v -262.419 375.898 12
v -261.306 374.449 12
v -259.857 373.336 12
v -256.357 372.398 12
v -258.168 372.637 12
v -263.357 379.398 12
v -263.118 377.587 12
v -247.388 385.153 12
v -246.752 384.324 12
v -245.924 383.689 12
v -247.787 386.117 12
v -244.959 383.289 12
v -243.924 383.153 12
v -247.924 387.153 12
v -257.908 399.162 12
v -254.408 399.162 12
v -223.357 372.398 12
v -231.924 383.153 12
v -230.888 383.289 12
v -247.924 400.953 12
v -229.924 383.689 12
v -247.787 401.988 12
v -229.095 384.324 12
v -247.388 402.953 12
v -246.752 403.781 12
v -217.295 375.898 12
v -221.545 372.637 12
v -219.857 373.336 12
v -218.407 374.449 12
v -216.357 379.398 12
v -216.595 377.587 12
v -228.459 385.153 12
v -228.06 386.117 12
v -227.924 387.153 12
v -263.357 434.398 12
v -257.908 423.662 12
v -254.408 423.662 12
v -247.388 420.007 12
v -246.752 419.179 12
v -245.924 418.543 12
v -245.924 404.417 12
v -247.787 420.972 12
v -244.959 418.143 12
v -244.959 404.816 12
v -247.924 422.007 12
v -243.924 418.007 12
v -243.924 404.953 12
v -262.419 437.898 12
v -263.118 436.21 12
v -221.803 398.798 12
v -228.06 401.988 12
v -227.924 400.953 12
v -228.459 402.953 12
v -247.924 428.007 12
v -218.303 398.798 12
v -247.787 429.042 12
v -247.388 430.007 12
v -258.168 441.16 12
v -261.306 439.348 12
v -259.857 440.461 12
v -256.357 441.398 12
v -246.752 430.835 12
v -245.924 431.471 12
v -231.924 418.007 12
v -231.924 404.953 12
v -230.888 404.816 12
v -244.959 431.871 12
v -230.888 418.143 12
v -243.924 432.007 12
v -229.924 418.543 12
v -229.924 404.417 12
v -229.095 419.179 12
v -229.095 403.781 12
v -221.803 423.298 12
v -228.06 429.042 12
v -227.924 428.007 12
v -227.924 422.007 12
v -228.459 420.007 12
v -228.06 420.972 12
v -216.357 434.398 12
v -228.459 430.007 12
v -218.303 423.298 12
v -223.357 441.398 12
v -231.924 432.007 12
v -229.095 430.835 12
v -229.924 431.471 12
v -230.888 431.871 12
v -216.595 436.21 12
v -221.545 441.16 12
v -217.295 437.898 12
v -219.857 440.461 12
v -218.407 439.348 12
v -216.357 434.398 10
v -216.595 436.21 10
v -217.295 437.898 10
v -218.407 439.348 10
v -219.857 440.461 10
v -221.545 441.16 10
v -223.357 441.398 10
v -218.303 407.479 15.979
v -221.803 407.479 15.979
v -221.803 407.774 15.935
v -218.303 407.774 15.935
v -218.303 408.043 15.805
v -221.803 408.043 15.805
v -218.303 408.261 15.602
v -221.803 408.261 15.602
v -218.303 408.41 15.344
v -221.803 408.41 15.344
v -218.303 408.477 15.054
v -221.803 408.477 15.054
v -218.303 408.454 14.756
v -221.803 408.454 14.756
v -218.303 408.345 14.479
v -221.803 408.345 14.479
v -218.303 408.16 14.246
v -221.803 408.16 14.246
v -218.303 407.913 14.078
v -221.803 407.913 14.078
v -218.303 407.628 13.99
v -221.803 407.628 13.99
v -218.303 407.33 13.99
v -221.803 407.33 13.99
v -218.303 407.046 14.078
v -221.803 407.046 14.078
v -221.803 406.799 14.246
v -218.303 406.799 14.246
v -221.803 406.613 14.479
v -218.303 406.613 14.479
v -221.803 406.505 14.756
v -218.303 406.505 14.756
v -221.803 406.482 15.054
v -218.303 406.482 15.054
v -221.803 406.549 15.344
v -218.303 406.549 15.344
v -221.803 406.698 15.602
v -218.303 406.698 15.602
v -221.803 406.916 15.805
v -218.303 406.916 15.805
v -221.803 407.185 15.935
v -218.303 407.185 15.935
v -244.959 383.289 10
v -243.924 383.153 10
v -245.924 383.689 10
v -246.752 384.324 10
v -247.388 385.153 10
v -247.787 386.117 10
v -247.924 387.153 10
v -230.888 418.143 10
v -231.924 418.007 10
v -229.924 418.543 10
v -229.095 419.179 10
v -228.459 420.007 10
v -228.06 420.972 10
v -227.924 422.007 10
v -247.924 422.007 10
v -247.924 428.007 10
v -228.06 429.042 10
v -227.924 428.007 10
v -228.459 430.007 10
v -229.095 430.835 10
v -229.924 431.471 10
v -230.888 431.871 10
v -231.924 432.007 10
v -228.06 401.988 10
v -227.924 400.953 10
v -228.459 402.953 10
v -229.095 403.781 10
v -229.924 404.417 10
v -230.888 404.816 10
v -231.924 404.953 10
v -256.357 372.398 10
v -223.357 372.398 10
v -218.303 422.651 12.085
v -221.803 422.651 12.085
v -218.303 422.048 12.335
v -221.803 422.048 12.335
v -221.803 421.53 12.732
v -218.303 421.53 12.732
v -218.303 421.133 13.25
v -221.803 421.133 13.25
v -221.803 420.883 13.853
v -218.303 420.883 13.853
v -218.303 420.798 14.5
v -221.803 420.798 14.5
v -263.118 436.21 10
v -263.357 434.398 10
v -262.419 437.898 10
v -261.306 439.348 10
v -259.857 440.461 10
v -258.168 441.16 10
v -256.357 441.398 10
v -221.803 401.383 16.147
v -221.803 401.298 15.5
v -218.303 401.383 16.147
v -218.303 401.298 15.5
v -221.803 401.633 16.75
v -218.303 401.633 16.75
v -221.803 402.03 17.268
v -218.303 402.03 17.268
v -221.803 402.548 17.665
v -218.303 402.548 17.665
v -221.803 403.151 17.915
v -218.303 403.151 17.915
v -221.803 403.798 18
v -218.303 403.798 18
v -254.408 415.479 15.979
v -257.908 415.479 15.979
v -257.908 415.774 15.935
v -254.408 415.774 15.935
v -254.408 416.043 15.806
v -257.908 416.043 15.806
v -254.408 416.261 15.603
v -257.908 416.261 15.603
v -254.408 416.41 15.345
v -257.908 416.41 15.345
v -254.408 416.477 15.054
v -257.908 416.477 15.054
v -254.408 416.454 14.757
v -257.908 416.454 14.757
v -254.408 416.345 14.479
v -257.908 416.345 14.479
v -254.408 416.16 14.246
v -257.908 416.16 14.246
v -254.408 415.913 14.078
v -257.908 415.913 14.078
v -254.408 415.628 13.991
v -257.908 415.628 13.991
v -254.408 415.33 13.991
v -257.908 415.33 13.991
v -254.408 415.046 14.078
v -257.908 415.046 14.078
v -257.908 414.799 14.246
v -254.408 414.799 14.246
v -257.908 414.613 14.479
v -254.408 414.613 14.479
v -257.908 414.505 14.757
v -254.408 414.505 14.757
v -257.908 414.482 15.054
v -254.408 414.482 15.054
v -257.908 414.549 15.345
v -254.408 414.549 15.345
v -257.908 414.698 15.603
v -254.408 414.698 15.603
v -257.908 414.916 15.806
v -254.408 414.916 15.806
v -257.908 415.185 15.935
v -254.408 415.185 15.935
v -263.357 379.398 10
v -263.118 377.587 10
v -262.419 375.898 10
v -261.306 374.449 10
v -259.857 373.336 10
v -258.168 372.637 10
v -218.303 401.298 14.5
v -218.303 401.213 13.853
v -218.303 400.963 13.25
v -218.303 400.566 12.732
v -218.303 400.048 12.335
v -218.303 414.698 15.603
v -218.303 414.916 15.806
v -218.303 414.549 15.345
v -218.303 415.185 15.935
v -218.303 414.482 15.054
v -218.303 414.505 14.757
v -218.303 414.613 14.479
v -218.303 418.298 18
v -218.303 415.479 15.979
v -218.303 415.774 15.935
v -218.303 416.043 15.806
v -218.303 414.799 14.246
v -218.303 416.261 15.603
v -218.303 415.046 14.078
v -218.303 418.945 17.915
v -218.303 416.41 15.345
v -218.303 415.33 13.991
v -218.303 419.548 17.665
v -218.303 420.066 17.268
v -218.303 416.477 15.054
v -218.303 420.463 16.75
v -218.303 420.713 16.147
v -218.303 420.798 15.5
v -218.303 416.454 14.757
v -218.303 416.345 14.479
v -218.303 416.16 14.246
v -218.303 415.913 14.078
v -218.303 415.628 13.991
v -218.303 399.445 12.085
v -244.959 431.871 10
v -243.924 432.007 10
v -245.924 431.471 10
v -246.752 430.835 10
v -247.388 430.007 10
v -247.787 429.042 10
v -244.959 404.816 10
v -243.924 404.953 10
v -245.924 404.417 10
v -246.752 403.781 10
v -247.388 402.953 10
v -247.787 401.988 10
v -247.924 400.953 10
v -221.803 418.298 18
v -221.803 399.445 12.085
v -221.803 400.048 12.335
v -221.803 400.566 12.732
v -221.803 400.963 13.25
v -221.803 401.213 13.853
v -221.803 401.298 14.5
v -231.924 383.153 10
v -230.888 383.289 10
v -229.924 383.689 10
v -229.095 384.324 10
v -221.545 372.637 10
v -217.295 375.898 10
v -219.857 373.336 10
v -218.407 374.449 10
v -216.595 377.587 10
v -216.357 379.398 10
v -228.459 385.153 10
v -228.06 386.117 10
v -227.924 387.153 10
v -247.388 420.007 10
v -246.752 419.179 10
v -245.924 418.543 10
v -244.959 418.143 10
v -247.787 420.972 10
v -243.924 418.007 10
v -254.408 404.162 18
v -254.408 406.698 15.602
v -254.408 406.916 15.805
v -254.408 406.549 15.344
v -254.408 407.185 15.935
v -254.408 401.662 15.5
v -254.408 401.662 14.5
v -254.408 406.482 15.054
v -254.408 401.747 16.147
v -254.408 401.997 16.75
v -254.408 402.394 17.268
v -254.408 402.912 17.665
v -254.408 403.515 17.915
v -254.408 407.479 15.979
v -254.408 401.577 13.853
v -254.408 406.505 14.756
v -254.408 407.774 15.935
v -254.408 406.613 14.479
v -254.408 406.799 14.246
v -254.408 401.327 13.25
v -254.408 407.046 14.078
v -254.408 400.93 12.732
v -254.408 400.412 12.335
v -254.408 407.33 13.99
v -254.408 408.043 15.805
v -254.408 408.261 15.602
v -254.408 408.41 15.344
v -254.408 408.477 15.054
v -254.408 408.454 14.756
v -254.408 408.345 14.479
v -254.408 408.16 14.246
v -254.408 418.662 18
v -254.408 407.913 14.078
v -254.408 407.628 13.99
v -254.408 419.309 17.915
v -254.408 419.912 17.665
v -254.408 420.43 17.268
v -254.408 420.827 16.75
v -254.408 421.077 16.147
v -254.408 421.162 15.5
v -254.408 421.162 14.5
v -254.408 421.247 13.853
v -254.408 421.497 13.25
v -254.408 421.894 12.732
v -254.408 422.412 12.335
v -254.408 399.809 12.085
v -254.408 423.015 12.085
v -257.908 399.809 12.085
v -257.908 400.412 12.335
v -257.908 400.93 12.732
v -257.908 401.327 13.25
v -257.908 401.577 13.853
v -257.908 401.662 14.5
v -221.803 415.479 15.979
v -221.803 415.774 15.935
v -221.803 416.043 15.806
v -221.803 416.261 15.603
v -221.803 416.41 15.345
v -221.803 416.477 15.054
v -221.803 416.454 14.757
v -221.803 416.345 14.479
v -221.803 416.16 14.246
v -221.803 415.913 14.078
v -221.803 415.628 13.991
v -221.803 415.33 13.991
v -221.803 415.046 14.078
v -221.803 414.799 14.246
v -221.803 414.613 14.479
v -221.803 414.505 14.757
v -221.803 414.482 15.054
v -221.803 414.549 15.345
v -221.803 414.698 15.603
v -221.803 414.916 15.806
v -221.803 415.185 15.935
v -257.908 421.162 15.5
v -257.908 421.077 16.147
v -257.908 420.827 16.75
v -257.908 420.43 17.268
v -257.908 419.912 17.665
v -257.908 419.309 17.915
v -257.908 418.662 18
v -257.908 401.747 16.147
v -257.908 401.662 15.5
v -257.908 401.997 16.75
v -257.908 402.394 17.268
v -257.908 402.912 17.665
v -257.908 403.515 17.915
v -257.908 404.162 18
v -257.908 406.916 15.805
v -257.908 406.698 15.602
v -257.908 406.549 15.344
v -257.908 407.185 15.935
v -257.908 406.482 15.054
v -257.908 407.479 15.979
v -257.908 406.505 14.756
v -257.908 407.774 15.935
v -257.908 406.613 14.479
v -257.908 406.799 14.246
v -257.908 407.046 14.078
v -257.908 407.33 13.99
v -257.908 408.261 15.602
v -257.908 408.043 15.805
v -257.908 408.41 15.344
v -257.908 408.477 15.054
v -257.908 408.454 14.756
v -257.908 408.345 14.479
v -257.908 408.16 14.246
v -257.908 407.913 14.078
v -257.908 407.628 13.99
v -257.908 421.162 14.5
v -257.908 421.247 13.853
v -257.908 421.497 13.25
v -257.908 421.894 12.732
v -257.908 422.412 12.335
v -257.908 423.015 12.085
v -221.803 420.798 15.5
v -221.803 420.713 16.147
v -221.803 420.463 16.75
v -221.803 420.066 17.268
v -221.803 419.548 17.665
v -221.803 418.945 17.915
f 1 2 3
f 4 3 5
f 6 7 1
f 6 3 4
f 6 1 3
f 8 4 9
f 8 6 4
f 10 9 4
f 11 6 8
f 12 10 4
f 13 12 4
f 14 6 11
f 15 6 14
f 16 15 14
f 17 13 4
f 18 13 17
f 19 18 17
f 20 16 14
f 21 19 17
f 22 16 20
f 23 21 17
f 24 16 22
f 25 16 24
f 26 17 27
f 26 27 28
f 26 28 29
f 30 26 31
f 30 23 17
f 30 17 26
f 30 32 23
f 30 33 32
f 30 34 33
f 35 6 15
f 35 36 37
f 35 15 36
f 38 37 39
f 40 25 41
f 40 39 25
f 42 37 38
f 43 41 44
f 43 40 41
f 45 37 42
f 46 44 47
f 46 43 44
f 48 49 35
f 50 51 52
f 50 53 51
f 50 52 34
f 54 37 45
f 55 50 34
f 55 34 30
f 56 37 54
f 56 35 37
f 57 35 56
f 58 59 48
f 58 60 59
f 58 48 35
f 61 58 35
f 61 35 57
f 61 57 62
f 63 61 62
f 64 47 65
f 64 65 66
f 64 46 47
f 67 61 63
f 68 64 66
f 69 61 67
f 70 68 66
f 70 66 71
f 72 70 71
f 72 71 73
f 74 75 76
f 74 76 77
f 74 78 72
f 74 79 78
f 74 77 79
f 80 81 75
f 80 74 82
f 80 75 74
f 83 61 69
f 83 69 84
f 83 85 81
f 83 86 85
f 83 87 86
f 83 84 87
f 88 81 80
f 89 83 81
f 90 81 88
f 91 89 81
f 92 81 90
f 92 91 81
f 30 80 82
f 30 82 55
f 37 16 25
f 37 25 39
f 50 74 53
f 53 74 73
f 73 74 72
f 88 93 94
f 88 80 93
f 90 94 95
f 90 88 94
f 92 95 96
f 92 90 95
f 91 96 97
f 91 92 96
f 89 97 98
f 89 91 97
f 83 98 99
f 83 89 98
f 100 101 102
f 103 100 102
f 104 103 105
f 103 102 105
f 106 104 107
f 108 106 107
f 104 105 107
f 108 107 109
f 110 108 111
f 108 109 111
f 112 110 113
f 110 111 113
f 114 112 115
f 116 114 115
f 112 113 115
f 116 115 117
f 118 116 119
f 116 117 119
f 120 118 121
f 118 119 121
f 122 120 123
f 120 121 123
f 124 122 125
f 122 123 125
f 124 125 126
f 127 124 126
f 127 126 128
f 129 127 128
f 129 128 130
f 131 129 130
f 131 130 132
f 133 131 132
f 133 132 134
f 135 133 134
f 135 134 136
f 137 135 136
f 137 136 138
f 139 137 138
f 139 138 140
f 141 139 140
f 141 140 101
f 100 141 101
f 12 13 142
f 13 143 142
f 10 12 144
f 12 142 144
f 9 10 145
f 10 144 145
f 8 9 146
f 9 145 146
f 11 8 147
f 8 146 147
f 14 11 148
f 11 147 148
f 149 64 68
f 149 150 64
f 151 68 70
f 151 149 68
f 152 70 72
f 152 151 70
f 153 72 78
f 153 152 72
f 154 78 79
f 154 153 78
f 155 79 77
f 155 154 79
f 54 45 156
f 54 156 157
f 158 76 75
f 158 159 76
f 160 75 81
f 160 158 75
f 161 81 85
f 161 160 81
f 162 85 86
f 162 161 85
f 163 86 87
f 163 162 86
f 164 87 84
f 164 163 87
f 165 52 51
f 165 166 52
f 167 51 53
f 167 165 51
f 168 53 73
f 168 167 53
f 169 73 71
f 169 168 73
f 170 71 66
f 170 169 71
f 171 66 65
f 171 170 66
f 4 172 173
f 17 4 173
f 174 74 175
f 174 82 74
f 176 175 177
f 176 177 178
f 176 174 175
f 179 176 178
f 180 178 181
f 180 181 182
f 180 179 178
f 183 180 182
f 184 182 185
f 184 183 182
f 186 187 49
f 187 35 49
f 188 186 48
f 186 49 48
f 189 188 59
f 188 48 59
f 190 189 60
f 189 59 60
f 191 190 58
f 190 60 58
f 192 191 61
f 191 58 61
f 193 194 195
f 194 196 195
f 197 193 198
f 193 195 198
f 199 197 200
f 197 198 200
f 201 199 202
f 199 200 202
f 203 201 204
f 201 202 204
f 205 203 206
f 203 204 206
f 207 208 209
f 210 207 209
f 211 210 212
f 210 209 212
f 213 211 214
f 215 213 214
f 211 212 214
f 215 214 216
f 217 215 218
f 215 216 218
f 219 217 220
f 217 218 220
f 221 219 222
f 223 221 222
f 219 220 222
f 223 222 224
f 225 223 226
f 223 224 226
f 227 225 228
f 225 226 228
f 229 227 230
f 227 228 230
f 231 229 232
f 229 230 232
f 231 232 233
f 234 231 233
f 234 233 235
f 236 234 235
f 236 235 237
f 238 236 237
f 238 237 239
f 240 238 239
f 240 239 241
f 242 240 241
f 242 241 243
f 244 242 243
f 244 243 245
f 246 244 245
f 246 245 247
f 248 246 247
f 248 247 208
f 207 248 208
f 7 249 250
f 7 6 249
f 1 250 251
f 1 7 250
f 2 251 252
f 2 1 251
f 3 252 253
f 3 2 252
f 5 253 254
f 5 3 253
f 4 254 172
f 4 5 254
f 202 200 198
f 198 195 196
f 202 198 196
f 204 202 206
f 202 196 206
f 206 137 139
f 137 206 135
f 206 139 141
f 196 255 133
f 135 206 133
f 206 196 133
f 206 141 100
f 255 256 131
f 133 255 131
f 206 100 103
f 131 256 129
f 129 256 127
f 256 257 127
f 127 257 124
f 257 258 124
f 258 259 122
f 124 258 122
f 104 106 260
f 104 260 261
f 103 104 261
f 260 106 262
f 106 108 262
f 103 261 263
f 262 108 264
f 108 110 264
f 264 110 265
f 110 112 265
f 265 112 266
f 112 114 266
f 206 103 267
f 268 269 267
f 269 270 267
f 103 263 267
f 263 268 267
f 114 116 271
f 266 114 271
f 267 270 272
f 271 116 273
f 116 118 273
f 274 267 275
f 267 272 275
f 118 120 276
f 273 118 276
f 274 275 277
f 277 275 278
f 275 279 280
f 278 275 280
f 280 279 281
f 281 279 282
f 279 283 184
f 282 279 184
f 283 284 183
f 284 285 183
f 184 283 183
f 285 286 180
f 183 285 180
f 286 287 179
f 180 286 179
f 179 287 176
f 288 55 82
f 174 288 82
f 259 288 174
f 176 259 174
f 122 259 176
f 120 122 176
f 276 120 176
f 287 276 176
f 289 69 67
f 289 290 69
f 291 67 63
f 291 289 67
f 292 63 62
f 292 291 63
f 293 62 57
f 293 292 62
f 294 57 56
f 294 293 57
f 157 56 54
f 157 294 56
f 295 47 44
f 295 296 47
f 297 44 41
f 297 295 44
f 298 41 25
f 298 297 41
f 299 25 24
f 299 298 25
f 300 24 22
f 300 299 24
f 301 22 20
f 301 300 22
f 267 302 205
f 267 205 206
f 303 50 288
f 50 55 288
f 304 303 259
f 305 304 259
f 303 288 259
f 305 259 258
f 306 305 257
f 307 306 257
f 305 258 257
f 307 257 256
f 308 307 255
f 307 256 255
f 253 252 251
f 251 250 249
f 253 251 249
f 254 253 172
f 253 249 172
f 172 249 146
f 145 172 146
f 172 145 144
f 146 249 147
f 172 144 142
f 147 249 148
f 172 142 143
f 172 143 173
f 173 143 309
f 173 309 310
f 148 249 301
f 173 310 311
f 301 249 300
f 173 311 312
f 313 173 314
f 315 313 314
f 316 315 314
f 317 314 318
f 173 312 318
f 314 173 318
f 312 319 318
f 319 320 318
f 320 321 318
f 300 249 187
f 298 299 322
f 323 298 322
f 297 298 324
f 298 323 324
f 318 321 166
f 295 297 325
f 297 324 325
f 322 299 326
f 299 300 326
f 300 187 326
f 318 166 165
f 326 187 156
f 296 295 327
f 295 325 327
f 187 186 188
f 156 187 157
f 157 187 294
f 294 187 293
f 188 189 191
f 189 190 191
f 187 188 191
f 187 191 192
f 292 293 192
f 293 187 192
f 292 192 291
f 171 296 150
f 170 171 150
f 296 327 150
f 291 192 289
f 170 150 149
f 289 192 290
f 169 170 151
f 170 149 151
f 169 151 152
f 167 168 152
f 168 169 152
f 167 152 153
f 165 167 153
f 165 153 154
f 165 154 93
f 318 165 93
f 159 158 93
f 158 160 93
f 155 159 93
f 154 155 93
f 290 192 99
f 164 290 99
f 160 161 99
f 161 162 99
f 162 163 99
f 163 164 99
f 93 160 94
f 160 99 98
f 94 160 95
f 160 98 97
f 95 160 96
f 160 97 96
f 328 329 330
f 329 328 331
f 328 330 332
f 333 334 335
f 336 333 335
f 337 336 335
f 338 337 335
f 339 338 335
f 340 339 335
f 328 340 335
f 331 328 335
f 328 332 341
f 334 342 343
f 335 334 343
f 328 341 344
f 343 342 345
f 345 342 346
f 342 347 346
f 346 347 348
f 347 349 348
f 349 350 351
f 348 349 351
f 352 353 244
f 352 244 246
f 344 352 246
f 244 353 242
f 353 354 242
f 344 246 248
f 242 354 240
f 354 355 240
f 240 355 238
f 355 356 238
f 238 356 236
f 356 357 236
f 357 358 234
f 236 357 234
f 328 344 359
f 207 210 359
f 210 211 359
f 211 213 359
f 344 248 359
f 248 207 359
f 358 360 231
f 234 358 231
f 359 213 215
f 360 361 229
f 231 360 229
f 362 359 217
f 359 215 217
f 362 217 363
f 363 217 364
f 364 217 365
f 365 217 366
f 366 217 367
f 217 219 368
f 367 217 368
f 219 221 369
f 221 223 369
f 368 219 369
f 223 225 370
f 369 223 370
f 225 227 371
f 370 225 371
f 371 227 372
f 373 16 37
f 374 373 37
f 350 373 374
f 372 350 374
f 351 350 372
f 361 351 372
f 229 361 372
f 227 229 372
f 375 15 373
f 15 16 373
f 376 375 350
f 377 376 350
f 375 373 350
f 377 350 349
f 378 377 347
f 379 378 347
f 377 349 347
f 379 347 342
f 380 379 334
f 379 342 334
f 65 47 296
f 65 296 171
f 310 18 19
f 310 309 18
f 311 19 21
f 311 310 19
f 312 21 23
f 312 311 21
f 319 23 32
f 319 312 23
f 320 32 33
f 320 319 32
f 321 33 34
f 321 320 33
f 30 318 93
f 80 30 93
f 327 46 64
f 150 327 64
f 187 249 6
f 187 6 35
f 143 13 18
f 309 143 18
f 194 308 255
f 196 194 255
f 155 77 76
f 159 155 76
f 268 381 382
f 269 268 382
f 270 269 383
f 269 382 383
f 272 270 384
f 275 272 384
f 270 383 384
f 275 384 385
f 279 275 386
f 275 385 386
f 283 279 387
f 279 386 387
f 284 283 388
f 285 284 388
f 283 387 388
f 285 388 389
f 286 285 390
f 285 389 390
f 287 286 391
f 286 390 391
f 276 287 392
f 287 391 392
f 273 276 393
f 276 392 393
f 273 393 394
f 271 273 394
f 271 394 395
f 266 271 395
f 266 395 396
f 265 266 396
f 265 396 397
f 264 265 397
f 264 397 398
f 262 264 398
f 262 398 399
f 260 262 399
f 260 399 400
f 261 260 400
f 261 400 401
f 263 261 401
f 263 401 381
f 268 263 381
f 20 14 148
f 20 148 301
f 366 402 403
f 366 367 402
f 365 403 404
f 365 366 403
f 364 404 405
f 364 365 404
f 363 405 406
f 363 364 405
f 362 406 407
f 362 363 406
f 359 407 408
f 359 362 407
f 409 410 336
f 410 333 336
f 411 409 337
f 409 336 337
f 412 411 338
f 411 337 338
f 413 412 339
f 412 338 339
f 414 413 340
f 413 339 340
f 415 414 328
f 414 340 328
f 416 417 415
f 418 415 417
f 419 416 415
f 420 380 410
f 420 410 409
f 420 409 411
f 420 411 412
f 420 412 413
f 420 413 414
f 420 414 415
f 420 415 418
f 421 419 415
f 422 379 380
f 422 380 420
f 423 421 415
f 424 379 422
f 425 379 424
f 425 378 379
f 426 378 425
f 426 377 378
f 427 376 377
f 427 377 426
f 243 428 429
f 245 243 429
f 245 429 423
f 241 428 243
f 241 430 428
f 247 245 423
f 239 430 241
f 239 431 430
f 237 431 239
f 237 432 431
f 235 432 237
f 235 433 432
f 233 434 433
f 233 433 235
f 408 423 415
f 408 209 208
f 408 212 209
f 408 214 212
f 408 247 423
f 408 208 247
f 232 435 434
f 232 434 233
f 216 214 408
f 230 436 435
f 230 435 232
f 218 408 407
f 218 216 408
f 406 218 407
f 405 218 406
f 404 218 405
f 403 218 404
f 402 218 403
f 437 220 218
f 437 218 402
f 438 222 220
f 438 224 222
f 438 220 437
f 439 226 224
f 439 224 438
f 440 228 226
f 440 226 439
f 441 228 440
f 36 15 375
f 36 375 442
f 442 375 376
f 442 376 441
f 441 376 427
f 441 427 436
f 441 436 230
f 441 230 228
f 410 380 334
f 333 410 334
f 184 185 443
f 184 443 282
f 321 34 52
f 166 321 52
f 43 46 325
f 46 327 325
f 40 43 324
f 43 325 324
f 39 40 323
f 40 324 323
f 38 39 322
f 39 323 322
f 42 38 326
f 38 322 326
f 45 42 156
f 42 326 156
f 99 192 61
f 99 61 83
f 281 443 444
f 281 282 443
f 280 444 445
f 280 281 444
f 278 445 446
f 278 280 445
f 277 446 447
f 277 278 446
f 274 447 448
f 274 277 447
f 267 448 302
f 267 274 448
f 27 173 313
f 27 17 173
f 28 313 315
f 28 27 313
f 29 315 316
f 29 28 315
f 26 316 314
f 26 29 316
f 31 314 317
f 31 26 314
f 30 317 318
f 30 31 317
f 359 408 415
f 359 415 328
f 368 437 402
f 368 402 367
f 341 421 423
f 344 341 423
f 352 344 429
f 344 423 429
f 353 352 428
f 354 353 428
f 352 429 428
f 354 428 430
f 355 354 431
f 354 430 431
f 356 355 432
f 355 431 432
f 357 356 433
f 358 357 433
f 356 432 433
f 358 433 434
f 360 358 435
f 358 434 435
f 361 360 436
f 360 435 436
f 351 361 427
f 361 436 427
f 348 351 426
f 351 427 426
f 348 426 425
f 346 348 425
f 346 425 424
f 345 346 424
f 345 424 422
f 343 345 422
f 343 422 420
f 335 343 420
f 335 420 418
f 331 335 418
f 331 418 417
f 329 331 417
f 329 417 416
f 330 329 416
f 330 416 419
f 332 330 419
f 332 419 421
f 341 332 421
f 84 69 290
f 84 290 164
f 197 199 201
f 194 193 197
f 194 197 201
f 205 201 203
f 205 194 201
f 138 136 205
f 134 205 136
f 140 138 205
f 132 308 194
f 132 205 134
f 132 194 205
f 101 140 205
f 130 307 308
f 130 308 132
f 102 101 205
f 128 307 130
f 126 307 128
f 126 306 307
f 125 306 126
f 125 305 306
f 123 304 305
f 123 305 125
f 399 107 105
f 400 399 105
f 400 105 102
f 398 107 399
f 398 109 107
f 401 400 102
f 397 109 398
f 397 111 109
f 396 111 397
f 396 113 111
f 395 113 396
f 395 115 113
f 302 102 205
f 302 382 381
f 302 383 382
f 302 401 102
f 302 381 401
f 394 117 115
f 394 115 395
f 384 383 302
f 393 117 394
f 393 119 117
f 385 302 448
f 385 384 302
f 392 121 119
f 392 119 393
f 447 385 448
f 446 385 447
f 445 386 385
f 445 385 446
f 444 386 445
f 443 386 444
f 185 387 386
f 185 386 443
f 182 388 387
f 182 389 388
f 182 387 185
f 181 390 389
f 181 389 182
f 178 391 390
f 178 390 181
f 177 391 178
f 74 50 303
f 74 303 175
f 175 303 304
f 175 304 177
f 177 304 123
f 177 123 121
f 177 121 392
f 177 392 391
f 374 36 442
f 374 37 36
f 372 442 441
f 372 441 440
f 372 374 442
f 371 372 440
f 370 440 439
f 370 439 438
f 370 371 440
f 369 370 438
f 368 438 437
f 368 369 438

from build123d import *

# Parameters (mm, degrees)
SKETCH1_W           = 47
SKETCH1_H           = 69
BOSS_EXTRUDE1_DEPTH = 2
FILLET1_R           = 7
SKETCH2_W           = 20
SKETCH2_H           = 14
SKETCH2_H_2         = 21.8
CUT_EXTRUDE1_DEPTH  = 2
SKETCH3_W           = 3.5
SKETCH3_H           = 19.5
BOSS_EXTRUDE2_DEPTH = 6
FILLET2_R           = 4
FILLET3_R           = 2.5
SKETCH4_R           = 1
CUT_EXTRUDE2_DEPTH  = 444.714975323


with BuildPart() as part:
    # Sketch1 → Boss-Extrude1 (new body)
    with BuildSketch(Plane.XY.offset(10)):
        with Locations((-239.856711142, 406.898341584)):
            Rectangle(SKETCH1_W, SKETCH1_H)
    extrude(amount=BOSS_EXTRUDE1_DEPTH)

    # Fillet1
    fillet1_edges = [part.edges().sort_by_distance(p)[0] for p in [
        (-263.356711142, 441.398341584, 11),
        (-216.356711142, 441.398341584, 11),
        (-216.356711142, 372.398341584, 11),
        (-263.356711142, 372.398341584, 11),
    ]]
    fillet(fillet1_edges, radius=FILLET1_R)

    # Sketch2 → Cut-Extrude1 (cut)
    with BuildSketch(Plane.XY.offset(12)):
        with Locations((-237.923586614, 425.007047567)):
            Rectangle(SKETCH2_W, SKETCH2_H)
        with Locations((-237.923586614, 394.052620238)):
            Rectangle(SKETCH2_W, SKETCH2_H_2)
    extrude(amount=-CUT_EXTRUDE1_DEPTH, mode=Mode.SUBTRACT)

    # Sketch3 → Boss-Extrude2 (add)
    with BuildSketch(Plane.XY.offset(12)):
        with Locations((-220.053070068, 411.047943115)):
            Rectangle(SKETCH3_W, SKETCH3_H)
        with Locations((-256.157684326, 411.411865234)):
            Rectangle(SKETCH3_W, SKETCH3_H)
    extrude(amount=BOSS_EXTRUDE2_DEPTH)

    # Fillet2
    fillet2_edges = [part.edges().sort_by_distance(p)[0] for p in [
        (-247.923586614, 418.007047567, 11),
        (-247.923586614, 432.007047567, 11),
        (-227.923586614, 432.007047567, 11),
        (-227.923586614, 418.007047567, 11),
        (-247.923586614, 383.152620238, 11),
        (-247.923586614, 404.952620238, 11),
        (-227.923586614, 404.952620238, 11),
        (-227.923586614, 383.152620238, 11),
    ]]
    fillet(fillet2_edges, radius=FILLET2_R)

    # Fillet3
    fillet3_edges = [part.edges().sort_by_distance(p)[0] for p in [
        (-256.157684326, 421.161865234, 12),
        (-256.157684326, 401.661865234, 12),
        (-256.157684326, 421.161865234, 18),
        (-256.157684326, 401.661865234, 18),
        (-220.053070068, 401.297943115, 12),
        (-220.053070068, 420.797943115, 12),
        (-220.053070068, 401.297943115, 18),
        (-220.053070068, 420.797943115, 18),
    ]]
    fillet(fillet3_edges, radius=FILLET3_R)

    # Sketch4 → Cut-Extrude2 (cut, through all)
    with BuildSketch(Plane.ZY.offset(257.907684326)):
        with Locations((14.979375571, 415.479440957)):
            Circle(SKETCH4_R)
        with Locations((14.978983816, 407.479440966)):
            Circle(SKETCH4_R)
    extrude(amount=-CUT_EXTRUDE2_DEPTH, mode=Mode.SUBTRACT)


solid = part.part
